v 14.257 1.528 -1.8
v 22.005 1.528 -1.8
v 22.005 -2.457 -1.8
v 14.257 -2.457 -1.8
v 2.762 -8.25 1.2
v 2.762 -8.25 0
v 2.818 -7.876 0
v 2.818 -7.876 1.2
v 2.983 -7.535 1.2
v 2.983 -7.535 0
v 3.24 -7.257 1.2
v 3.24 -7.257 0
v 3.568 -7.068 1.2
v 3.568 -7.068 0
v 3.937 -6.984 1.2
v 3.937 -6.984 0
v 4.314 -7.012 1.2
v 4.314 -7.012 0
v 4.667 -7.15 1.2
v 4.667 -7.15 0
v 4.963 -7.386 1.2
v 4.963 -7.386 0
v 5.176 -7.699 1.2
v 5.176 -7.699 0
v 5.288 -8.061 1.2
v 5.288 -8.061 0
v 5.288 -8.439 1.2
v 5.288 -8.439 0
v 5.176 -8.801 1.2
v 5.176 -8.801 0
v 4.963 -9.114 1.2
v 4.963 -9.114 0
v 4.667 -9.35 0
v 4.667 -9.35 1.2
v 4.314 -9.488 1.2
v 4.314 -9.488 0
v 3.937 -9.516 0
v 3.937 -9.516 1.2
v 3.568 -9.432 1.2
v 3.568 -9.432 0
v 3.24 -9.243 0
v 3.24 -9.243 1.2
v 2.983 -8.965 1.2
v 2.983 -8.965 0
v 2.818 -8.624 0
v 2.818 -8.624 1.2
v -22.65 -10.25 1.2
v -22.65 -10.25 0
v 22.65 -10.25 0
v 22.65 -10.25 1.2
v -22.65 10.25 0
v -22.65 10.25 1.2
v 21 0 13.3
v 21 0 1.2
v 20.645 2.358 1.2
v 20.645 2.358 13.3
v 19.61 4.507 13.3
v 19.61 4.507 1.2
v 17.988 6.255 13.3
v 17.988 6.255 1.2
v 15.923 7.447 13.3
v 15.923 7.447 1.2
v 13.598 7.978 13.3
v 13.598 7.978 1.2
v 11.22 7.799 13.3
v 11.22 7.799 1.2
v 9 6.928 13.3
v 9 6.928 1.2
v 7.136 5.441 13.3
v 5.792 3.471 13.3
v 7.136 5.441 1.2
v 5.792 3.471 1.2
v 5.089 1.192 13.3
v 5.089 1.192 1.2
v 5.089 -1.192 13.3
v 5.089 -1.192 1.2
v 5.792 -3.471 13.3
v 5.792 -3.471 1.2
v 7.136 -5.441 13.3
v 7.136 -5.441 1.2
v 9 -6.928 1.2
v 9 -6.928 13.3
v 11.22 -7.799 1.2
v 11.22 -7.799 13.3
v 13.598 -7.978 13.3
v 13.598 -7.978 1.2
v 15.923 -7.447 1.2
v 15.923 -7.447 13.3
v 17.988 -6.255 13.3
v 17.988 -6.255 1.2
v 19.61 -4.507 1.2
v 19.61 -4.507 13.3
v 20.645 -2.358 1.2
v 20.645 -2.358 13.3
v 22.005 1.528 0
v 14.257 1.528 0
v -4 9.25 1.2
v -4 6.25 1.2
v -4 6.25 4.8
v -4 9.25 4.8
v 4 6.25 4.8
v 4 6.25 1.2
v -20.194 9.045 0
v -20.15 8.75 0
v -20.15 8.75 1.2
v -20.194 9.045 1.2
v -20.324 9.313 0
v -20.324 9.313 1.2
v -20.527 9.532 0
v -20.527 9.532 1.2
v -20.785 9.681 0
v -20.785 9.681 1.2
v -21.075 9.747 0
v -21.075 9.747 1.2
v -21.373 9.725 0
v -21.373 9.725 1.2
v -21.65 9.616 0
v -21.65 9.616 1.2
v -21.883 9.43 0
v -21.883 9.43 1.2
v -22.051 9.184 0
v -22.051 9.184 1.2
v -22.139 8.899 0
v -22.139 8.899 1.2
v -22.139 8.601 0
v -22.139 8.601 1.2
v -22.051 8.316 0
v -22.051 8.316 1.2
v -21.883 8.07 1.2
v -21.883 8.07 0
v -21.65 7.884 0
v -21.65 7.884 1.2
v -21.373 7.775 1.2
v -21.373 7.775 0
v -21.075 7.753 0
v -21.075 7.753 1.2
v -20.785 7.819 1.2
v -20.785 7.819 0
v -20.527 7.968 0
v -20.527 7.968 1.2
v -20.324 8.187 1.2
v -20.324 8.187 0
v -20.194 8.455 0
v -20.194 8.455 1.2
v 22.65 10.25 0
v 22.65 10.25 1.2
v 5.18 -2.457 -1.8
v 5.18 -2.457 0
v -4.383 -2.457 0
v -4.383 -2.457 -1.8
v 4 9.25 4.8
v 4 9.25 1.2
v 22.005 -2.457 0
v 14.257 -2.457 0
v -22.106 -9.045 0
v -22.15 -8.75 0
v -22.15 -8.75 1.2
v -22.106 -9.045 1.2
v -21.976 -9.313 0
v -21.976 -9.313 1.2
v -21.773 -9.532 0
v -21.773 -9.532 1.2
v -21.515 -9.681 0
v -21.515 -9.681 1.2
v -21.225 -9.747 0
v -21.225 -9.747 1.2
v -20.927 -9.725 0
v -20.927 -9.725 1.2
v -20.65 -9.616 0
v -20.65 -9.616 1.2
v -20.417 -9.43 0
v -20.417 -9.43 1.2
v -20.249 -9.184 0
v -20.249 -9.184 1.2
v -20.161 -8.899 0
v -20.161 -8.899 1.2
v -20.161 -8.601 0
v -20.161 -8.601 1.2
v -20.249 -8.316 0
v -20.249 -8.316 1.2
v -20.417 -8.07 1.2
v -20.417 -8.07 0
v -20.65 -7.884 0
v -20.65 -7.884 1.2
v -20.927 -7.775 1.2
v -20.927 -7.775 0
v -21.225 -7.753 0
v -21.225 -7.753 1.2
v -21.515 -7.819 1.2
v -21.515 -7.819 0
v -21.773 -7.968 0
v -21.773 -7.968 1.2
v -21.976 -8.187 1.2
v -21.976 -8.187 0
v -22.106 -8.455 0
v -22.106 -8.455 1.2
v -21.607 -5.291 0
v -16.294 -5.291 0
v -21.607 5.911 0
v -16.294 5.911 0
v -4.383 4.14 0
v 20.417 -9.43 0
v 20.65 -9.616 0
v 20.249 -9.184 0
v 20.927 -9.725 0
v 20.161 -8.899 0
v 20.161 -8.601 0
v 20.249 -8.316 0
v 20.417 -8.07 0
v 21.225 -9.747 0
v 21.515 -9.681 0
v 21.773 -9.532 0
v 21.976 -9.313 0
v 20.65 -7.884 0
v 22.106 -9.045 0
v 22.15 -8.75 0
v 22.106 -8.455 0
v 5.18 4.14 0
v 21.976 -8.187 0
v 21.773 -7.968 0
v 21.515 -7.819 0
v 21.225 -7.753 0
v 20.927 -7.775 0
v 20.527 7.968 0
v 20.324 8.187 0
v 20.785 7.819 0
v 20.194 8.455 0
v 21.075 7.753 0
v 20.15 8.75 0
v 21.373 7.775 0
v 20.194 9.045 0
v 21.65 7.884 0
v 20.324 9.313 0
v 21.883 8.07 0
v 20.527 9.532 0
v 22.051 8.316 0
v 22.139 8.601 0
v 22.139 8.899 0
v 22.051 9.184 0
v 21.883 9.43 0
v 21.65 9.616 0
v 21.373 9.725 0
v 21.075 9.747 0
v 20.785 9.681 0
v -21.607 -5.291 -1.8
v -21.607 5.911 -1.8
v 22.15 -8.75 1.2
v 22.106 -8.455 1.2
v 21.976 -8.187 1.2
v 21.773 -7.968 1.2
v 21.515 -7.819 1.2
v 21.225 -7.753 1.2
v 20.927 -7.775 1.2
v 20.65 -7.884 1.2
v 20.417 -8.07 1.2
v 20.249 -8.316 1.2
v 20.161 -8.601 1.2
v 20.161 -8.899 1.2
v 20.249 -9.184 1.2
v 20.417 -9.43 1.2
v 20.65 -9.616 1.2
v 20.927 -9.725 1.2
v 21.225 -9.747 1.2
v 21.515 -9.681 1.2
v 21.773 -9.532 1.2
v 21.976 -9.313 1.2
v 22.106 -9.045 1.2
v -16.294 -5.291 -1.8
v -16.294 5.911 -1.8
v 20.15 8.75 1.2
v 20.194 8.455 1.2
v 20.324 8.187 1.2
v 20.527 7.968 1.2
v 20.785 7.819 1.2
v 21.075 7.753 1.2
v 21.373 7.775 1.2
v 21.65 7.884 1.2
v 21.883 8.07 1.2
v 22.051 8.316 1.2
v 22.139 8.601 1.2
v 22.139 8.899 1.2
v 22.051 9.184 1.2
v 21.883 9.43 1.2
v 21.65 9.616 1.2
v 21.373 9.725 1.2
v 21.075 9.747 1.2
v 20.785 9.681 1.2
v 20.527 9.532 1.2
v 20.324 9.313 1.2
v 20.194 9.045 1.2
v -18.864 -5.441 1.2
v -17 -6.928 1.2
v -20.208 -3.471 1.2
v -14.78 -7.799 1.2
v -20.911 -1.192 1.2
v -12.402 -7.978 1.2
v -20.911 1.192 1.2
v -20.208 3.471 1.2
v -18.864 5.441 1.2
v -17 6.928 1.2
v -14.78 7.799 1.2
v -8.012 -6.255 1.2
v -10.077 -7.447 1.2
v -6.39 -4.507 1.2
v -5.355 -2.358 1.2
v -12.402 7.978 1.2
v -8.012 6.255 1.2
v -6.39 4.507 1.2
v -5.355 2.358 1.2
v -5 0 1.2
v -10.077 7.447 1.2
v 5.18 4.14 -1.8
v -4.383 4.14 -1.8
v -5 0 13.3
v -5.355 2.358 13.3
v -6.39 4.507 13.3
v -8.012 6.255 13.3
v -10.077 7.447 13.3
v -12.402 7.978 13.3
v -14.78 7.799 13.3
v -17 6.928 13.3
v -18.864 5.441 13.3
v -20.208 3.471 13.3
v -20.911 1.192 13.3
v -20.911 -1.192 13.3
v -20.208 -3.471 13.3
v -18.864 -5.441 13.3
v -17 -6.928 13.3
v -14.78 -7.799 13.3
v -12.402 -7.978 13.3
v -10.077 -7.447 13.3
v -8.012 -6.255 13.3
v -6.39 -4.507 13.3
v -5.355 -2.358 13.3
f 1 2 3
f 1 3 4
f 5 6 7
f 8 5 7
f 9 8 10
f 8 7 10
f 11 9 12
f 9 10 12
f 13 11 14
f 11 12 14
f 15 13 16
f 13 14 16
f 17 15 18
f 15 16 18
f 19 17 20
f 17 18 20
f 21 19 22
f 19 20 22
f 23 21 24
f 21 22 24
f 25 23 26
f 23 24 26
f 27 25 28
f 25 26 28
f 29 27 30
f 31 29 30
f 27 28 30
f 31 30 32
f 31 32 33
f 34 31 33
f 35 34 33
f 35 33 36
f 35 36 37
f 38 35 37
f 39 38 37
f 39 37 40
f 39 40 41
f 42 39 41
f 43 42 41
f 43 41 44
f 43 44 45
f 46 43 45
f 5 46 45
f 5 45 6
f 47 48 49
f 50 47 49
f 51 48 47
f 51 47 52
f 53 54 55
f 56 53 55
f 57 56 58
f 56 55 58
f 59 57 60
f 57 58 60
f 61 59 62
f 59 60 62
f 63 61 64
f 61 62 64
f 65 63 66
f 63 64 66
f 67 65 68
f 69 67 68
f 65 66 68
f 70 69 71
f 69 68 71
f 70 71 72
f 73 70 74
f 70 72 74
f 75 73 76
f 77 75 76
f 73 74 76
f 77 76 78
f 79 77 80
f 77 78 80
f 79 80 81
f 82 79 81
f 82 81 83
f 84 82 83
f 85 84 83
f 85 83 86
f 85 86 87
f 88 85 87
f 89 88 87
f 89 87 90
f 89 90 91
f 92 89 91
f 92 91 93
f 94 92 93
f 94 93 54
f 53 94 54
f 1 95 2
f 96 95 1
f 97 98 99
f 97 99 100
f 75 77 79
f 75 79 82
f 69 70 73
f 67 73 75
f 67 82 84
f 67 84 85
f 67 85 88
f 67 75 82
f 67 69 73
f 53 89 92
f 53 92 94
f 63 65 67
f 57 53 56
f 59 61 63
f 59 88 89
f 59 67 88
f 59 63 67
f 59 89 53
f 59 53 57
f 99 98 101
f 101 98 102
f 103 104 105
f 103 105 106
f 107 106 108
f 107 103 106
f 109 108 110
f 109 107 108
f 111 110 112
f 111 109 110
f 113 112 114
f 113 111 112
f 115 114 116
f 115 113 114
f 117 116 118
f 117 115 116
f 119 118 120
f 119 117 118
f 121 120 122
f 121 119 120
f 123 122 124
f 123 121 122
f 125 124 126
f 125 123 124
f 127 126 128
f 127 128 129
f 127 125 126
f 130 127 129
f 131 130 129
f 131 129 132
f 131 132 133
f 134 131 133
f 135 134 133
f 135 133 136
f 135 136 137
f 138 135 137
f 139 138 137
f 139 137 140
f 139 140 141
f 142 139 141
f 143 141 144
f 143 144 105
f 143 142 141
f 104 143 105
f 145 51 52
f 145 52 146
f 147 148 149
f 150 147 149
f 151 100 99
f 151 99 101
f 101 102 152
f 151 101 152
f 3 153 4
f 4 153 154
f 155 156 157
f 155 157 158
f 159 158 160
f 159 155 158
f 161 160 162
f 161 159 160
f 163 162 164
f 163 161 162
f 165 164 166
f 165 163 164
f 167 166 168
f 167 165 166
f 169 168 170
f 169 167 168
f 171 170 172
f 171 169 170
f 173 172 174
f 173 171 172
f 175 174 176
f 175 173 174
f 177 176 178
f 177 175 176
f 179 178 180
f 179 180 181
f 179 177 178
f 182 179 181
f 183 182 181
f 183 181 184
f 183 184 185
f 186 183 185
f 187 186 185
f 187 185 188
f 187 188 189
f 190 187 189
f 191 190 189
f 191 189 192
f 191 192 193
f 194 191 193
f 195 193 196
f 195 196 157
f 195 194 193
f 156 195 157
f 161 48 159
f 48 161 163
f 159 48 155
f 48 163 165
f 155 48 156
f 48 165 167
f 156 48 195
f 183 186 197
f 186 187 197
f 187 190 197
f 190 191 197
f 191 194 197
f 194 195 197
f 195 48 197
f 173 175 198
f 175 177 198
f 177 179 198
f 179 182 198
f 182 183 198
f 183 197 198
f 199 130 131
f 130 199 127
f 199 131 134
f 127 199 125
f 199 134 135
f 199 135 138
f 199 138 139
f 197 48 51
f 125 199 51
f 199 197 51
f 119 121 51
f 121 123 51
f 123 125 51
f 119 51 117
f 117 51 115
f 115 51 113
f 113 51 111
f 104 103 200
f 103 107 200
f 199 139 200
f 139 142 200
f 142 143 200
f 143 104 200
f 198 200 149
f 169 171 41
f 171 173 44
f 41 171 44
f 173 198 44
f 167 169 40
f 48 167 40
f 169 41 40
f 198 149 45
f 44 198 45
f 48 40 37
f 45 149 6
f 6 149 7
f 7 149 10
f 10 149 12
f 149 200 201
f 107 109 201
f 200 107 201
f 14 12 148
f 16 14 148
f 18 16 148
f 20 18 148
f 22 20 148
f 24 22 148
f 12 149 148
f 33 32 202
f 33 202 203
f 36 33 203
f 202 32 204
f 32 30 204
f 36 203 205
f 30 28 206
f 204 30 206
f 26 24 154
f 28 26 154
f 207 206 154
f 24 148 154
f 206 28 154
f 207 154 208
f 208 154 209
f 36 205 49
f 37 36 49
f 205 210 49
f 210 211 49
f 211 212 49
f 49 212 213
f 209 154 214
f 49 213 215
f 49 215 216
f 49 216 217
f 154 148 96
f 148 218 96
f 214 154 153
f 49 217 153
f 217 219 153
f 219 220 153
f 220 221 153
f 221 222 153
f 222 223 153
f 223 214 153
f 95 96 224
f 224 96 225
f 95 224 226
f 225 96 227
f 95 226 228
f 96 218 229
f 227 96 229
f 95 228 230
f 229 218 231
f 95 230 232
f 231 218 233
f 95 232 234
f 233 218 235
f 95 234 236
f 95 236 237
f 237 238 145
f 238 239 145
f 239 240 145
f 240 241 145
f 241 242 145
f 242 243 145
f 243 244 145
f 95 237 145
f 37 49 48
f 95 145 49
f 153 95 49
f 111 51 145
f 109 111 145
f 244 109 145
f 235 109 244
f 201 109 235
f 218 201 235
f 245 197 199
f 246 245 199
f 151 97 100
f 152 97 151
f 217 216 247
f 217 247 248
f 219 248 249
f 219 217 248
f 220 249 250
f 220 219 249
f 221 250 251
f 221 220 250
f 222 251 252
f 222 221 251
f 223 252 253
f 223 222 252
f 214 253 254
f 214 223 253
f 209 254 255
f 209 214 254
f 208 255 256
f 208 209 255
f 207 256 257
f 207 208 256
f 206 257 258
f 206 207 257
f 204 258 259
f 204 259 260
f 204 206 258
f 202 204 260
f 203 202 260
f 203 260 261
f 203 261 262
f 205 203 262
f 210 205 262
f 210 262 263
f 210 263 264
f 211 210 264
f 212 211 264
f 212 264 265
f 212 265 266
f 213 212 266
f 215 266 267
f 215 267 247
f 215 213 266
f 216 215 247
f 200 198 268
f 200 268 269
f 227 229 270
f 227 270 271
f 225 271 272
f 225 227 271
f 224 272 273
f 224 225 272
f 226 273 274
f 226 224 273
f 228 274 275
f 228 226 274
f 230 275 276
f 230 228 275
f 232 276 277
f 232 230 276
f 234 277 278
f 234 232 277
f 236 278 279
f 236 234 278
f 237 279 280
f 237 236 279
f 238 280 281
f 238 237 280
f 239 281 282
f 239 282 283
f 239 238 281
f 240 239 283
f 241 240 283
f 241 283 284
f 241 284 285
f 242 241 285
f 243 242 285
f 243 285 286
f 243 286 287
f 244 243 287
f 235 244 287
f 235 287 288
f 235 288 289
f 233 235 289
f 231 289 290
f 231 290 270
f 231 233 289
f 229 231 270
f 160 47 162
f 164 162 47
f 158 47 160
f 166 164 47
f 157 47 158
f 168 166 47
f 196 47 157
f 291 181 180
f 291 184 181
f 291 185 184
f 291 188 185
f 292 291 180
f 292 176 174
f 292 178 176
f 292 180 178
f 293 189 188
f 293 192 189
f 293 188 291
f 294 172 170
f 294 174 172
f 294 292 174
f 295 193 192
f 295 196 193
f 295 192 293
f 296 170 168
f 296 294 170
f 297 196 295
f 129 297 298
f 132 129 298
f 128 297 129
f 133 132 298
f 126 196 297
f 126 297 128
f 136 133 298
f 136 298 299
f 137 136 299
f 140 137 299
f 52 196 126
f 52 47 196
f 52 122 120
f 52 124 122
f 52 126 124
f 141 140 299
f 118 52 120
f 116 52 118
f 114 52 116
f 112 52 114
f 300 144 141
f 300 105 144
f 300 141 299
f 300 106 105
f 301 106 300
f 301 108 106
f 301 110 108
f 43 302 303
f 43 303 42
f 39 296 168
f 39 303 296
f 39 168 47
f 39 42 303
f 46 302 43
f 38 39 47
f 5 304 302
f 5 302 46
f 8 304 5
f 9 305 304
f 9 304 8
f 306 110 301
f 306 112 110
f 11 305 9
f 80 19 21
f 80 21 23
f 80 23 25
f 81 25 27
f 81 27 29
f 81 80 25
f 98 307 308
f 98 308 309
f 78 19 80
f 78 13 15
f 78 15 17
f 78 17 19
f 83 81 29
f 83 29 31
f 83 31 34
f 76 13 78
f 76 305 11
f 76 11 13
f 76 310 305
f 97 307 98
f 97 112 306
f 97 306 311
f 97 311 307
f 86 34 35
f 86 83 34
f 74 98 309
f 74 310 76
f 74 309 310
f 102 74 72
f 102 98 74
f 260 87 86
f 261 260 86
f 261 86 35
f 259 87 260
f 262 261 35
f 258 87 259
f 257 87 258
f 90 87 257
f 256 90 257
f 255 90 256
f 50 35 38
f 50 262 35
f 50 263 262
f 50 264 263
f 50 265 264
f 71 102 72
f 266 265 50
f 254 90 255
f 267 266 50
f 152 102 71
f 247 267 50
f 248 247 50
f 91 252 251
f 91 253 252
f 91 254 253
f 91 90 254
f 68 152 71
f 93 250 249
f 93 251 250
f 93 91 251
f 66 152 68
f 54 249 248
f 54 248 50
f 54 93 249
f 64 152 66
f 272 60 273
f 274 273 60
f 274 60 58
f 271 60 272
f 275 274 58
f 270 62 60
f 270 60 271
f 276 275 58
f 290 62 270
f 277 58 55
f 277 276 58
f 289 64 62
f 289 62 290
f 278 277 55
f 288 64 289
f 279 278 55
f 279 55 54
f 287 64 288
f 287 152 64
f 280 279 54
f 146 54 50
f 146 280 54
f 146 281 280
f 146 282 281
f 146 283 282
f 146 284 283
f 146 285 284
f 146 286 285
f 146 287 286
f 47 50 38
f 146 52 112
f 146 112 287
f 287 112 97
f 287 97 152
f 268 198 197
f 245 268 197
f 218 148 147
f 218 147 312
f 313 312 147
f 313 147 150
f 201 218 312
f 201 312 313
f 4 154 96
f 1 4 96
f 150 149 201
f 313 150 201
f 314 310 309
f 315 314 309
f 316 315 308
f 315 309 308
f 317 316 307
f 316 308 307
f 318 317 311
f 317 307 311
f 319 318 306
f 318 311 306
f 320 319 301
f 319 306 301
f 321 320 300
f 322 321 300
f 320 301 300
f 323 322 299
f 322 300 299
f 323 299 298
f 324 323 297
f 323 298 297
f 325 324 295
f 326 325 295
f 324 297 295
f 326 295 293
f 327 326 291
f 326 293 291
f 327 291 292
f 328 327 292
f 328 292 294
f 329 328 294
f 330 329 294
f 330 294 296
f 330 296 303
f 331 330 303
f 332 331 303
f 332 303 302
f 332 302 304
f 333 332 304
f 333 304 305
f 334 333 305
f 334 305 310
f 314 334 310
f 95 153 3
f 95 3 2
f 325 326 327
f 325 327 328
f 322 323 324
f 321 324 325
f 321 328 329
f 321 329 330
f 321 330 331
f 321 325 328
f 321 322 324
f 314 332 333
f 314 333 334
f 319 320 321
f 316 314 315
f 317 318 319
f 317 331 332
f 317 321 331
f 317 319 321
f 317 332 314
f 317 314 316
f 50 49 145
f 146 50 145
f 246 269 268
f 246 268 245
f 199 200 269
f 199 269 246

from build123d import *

# Parameters (mm, degrees)
SKETCH_1_W          = 45.3
SKETCH_1_H          = 20.5
SKETCH_1_R          = 8
SKETCH_1_R_2        = 1
EXTRUDE_1_DEPTH     = 1.2
EXTRUDE_START       = -1.2
SKETCH_2_R          = 8
EXTRUDE_2_DEPTH     = 13.3
SKETCH_3_W          = 8
SKETCH_3_H          = 3
EXTRUDE_3_DEPTH     = 4.8
SKETCH_5_W          = 7.748347941
SKETCH_5_H          = 3.984864655
SKETCH_5_W_2        = 9.563675173
SKETCH_5_H_2        = 6.597164818
SKETCH_5_W_3        = 5.313152873
SKETCH_5_H_3        = 11.201897308
EXTRUDE_4_DEPTH     = 3
CUT_EXTRUDE_1_REACH = 30.195
SKETCH_6_R          = 1.27


with BuildPart() as part:
    # 草图1 → 凸台-拉伸1 (new body)
    with BuildSketch(Plane.XY):
        Rectangle(SKETCH_1_W, SKETCH_1_H)
        with Locations((-13, 0)):
            Circle(SKETCH_1_R, mode=Mode.SUBTRACT)
        with Locations((13, 0)):
            Circle(SKETCH_1_R, mode=Mode.SUBTRACT)
        with Locations((-21.15, 8.75)):
            Circle(SKETCH_1_R_2, mode=Mode.SUBTRACT)
        with Locations(Location((21.15, 8.75, 0), (0, 0, 180))):
            Circle(SKETCH_1_R_2, mode=Mode.SUBTRACT)
        with Locations(Location((-21.15, -8.75, 0), (0, 0, 180))):
            Circle(SKETCH_1_R_2, mode=Mode.SUBTRACT)
        with Locations((21.15, -8.75)):
            Circle(SKETCH_1_R_2, mode=Mode.SUBTRACT)
    extrude(amount=EXTRUDE_1_DEPTH)

    # 草图2 → 凸台-拉伸2 (add)
    with BuildSketch(Plane.XY.offset(1.2).offset(EXTRUDE_START)):
        with Locations((13, 0)):
            Circle(SKETCH_2_R)
        with Locations((-13, 0)):
            Circle(SKETCH_2_R)
    extrude(amount=EXTRUDE_2_DEPTH)

    # 草图3 → 凸台-拉伸3 (add)
    with BuildSketch(Plane.XY.offset(1.2).offset(EXTRUDE_START)):
        with Locations((0, 7.75)):
            Rectangle(SKETCH_3_W, SKETCH_3_H)
    extrude(amount=EXTRUDE_3_DEPTH)

    # 草图5 → 凸台-拉伸4 (add)
    with BuildSketch(Plane(origin=(0, 0, 0), x_dir=(-1, 0, 0), z_dir=(0, 0, -1)).offset(EXTRUDE_START)):
        with Locations((-18.131134181, -0.464900877)):
            Rectangle(SKETCH_5_W, SKETCH_5_H)
        with Locations((-0.398486465, 0.841249205)):
            Rectangle(SKETCH_5_W_2, SKETCH_5_H_2)
        with Locations((18.950245248, 0.309933918)):
            Rectangle(SKETCH_5_W_3, SKETCH_5_H_3)
    extrude(amount=EXTRUDE_4_DEPTH)

    # 草图6 → 切除-拉伸1 (cut, up to next)
    with BuildSketch(Plane(origin=(0, 0, 0), x_dir=(-1, 0, 0), z_dir=(0, 0, -1)), mode=Mode.PRIVATE) as cut_extrude_1_sk1:
        with Locations((-4.031891603, -8.25)):
            Circle(SKETCH_6_R)
    cut_extrude_1_tool1 = extrude(cut_extrude_1_sk1.sketch, amount=-CUT_EXTRUDE_1_REACH, mode=Mode.PRIVATE) & part.part
    add(cut_extrude_1_tool1.solids().sort_by_distance((4.031892, -8.25, 0))[0], mode=Mode.SUBTRACT)


solid = part.part
